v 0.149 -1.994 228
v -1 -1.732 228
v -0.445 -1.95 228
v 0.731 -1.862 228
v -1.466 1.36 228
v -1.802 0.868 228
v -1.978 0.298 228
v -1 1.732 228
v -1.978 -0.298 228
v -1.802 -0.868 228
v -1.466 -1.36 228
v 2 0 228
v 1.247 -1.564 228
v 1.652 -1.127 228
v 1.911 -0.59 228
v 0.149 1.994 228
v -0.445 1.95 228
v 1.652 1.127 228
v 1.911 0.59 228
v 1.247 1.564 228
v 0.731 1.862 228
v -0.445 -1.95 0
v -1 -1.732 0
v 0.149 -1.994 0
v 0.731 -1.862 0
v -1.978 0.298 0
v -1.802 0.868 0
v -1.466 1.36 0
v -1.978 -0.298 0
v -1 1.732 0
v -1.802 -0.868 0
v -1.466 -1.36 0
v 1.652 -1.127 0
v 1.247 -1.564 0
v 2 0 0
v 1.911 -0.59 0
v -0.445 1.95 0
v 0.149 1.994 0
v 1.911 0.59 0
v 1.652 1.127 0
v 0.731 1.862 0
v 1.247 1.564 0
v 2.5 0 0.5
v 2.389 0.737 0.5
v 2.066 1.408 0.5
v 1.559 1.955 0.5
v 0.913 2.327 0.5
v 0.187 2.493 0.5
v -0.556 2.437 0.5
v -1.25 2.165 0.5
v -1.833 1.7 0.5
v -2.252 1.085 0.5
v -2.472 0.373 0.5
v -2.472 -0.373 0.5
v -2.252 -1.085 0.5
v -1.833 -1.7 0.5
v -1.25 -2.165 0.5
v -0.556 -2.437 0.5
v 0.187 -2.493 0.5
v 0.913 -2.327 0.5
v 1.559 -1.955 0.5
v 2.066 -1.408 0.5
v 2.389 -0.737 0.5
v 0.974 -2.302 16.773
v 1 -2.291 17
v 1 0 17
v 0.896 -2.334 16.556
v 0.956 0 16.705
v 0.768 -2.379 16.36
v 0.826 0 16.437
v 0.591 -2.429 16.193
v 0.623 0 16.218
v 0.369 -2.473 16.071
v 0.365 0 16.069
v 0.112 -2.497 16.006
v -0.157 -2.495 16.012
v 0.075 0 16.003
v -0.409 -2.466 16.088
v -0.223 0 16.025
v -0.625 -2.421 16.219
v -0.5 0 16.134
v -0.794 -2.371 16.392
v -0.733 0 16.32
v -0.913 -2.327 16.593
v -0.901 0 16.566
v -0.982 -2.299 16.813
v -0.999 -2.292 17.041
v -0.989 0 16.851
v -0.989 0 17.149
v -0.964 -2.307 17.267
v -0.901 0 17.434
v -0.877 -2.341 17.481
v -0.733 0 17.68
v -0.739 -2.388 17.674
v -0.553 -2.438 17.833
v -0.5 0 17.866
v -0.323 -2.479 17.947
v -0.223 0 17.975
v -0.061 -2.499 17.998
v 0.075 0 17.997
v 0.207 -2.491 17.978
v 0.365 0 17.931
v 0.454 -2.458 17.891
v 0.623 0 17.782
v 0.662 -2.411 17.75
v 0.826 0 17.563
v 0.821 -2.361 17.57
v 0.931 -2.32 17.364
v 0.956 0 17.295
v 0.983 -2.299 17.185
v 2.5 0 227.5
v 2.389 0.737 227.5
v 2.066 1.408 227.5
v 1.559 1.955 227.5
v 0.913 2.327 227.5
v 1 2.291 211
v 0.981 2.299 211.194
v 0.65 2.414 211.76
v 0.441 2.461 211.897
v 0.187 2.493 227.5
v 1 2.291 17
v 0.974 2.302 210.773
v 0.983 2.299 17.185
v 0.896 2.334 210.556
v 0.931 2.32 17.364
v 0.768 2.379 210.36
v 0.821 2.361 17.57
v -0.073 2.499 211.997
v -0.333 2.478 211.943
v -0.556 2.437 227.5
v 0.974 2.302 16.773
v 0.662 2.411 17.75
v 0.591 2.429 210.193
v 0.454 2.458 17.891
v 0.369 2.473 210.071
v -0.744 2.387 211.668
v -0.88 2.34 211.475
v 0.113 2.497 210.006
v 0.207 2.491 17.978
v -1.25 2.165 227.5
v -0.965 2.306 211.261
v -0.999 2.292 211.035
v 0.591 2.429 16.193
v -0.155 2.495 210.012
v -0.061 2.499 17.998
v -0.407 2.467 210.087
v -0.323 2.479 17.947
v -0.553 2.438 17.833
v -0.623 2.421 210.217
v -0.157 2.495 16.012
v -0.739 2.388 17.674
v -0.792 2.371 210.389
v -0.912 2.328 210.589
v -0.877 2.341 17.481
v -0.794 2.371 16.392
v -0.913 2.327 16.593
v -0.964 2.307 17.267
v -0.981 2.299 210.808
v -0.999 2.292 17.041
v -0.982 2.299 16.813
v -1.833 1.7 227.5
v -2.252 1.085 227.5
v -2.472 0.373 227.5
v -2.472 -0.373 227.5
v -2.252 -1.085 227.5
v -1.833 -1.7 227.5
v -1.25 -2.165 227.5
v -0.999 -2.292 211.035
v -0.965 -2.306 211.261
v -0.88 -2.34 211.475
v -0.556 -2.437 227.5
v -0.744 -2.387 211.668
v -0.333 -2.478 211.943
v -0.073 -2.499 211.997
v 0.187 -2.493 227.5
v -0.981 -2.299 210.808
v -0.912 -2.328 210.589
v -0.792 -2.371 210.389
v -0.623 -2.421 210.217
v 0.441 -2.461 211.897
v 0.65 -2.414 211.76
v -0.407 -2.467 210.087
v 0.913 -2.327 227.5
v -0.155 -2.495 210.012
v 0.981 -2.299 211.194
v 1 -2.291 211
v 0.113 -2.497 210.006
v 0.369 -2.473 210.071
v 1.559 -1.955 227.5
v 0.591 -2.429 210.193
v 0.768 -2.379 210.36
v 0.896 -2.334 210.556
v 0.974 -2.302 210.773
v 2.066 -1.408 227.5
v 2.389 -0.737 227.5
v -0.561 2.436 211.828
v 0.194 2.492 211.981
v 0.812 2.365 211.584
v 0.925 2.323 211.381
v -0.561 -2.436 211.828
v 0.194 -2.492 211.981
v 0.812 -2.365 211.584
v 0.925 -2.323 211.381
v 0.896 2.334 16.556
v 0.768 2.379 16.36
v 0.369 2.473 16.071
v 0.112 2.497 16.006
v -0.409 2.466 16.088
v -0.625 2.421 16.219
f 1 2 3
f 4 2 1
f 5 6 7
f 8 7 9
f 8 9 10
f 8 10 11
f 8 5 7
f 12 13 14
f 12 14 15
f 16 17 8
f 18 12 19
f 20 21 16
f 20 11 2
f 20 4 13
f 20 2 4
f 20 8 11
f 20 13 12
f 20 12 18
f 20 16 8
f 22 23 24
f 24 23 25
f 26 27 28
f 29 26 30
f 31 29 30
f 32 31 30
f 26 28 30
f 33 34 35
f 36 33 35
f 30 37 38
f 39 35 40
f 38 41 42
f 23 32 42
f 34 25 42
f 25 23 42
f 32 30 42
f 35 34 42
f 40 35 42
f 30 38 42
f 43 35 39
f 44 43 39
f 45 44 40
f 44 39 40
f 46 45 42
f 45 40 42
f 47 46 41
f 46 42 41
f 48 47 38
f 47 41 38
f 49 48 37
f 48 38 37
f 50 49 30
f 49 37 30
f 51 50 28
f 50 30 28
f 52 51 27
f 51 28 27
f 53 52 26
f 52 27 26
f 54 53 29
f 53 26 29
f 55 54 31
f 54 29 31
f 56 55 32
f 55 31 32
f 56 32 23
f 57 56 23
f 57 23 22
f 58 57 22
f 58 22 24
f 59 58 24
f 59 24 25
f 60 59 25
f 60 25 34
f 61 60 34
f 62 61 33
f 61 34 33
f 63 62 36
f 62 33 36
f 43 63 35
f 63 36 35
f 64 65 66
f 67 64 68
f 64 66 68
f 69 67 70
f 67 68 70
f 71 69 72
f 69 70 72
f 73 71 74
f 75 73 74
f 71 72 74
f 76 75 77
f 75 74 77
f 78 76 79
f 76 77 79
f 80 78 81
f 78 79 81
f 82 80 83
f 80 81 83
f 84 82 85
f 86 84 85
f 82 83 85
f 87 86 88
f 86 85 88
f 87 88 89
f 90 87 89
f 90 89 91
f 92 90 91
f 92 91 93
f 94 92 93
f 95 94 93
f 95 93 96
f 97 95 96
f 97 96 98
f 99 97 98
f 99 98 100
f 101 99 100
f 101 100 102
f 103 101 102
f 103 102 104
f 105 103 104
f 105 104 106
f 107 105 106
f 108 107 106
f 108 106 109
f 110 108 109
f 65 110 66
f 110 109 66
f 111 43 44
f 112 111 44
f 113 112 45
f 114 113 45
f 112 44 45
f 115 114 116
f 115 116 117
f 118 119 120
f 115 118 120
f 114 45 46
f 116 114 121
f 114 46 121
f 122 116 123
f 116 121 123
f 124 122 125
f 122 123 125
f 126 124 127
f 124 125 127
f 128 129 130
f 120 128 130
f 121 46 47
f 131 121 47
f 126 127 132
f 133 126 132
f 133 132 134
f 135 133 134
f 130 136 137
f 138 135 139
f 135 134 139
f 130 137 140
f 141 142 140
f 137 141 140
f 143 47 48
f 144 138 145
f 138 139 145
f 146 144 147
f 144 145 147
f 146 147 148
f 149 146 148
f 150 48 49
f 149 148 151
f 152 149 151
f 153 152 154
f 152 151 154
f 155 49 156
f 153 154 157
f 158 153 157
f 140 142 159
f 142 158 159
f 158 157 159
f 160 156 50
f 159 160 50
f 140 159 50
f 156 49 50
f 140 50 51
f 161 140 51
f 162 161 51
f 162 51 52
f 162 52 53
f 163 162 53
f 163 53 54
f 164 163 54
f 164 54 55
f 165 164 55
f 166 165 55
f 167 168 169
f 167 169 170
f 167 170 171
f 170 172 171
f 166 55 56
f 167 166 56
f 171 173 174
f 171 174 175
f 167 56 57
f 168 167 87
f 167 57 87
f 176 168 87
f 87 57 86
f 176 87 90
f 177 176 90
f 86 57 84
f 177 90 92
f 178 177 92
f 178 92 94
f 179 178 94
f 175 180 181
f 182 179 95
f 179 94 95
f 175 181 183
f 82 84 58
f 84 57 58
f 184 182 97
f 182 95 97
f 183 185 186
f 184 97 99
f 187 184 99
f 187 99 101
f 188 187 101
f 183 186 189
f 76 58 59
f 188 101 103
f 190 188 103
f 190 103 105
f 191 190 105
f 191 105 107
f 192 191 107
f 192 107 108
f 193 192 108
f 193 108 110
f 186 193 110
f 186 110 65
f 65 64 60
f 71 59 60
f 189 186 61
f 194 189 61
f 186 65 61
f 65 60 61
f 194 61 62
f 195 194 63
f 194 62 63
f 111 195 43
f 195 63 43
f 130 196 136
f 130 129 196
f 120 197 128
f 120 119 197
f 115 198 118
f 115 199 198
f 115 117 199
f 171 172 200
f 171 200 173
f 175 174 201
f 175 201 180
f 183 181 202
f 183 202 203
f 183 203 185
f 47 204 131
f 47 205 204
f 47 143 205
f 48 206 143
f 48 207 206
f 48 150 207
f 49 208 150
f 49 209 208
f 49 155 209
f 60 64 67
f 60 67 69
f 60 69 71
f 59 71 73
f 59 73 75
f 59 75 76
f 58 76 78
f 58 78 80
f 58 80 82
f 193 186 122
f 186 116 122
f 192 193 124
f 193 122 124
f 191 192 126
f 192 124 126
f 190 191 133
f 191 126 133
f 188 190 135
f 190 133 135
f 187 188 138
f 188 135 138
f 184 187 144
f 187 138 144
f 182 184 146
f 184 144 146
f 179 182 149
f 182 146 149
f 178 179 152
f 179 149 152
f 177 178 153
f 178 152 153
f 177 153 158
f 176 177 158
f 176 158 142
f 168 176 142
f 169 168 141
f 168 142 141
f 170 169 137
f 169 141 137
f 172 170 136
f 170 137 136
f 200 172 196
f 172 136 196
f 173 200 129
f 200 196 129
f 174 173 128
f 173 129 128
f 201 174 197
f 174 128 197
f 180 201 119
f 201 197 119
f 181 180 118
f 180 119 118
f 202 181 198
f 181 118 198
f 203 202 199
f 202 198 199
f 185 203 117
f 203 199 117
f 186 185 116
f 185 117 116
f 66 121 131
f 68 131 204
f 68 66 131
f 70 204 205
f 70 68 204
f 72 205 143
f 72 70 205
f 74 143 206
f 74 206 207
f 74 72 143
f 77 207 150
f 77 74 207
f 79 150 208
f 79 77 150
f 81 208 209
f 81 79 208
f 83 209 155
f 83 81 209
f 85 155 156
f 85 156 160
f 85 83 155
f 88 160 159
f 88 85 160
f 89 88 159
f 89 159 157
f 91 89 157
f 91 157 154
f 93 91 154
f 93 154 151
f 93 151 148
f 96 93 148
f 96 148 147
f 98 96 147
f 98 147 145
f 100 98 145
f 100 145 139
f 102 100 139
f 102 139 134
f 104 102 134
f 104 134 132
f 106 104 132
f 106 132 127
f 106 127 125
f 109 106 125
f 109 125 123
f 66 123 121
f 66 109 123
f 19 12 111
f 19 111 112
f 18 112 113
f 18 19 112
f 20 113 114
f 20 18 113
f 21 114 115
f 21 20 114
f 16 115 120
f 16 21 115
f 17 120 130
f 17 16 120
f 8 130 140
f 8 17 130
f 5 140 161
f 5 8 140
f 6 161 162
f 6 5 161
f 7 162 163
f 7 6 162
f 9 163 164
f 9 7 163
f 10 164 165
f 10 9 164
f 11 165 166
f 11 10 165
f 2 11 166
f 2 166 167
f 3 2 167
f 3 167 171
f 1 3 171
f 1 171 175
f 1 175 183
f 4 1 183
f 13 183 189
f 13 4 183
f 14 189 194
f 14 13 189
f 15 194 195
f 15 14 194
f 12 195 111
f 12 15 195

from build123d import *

# Parameters (mm, degrees)
ESQUISSE1_R             = 2.5
BASE_EXTRUSION_DEPTH    = 228
CHANFREIN1_SIZE         = 0.5
ESQUISSE2_R             = 1
ENL_V_MAT_EXTRU_1_DEPTH = 50


with BuildPart() as part:
    # Esquisse1 → Base-Extrusion (new body)
    with BuildSketch(Plane.XY):
        Circle(ESQUISSE1_R)
    extrude(amount=BASE_EXTRUSION_DEPTH)

    # Chanfrein1
    chanfrein1_edges = [part.edges().sort_by_distance(p)[0] for p in [
        (-2.5, 0, 0),
        (-2.5, 0, 228),
    ]]
    chamfer(chanfrein1_edges, length=CHANFREIN1_SIZE)

    # Esquisse2 → Enlèv. mat.-Extru.1 (cut, symmetric)
    with BuildSketch(Plane(origin=(0, 0, 0), x_dir=(1, 0, 0), z_dir=(0, 1, 0))):
        with Locations((0, -17)):
            Circle(ESQUISSE2_R)
        with Locations((0, -211)):
            Circle(ESQUISSE2_R)
    extrude(amount=ENL_V_MAT_EXTRU_1_DEPTH, both=True, mode=Mode.SUBTRACT)


solid = part.part
